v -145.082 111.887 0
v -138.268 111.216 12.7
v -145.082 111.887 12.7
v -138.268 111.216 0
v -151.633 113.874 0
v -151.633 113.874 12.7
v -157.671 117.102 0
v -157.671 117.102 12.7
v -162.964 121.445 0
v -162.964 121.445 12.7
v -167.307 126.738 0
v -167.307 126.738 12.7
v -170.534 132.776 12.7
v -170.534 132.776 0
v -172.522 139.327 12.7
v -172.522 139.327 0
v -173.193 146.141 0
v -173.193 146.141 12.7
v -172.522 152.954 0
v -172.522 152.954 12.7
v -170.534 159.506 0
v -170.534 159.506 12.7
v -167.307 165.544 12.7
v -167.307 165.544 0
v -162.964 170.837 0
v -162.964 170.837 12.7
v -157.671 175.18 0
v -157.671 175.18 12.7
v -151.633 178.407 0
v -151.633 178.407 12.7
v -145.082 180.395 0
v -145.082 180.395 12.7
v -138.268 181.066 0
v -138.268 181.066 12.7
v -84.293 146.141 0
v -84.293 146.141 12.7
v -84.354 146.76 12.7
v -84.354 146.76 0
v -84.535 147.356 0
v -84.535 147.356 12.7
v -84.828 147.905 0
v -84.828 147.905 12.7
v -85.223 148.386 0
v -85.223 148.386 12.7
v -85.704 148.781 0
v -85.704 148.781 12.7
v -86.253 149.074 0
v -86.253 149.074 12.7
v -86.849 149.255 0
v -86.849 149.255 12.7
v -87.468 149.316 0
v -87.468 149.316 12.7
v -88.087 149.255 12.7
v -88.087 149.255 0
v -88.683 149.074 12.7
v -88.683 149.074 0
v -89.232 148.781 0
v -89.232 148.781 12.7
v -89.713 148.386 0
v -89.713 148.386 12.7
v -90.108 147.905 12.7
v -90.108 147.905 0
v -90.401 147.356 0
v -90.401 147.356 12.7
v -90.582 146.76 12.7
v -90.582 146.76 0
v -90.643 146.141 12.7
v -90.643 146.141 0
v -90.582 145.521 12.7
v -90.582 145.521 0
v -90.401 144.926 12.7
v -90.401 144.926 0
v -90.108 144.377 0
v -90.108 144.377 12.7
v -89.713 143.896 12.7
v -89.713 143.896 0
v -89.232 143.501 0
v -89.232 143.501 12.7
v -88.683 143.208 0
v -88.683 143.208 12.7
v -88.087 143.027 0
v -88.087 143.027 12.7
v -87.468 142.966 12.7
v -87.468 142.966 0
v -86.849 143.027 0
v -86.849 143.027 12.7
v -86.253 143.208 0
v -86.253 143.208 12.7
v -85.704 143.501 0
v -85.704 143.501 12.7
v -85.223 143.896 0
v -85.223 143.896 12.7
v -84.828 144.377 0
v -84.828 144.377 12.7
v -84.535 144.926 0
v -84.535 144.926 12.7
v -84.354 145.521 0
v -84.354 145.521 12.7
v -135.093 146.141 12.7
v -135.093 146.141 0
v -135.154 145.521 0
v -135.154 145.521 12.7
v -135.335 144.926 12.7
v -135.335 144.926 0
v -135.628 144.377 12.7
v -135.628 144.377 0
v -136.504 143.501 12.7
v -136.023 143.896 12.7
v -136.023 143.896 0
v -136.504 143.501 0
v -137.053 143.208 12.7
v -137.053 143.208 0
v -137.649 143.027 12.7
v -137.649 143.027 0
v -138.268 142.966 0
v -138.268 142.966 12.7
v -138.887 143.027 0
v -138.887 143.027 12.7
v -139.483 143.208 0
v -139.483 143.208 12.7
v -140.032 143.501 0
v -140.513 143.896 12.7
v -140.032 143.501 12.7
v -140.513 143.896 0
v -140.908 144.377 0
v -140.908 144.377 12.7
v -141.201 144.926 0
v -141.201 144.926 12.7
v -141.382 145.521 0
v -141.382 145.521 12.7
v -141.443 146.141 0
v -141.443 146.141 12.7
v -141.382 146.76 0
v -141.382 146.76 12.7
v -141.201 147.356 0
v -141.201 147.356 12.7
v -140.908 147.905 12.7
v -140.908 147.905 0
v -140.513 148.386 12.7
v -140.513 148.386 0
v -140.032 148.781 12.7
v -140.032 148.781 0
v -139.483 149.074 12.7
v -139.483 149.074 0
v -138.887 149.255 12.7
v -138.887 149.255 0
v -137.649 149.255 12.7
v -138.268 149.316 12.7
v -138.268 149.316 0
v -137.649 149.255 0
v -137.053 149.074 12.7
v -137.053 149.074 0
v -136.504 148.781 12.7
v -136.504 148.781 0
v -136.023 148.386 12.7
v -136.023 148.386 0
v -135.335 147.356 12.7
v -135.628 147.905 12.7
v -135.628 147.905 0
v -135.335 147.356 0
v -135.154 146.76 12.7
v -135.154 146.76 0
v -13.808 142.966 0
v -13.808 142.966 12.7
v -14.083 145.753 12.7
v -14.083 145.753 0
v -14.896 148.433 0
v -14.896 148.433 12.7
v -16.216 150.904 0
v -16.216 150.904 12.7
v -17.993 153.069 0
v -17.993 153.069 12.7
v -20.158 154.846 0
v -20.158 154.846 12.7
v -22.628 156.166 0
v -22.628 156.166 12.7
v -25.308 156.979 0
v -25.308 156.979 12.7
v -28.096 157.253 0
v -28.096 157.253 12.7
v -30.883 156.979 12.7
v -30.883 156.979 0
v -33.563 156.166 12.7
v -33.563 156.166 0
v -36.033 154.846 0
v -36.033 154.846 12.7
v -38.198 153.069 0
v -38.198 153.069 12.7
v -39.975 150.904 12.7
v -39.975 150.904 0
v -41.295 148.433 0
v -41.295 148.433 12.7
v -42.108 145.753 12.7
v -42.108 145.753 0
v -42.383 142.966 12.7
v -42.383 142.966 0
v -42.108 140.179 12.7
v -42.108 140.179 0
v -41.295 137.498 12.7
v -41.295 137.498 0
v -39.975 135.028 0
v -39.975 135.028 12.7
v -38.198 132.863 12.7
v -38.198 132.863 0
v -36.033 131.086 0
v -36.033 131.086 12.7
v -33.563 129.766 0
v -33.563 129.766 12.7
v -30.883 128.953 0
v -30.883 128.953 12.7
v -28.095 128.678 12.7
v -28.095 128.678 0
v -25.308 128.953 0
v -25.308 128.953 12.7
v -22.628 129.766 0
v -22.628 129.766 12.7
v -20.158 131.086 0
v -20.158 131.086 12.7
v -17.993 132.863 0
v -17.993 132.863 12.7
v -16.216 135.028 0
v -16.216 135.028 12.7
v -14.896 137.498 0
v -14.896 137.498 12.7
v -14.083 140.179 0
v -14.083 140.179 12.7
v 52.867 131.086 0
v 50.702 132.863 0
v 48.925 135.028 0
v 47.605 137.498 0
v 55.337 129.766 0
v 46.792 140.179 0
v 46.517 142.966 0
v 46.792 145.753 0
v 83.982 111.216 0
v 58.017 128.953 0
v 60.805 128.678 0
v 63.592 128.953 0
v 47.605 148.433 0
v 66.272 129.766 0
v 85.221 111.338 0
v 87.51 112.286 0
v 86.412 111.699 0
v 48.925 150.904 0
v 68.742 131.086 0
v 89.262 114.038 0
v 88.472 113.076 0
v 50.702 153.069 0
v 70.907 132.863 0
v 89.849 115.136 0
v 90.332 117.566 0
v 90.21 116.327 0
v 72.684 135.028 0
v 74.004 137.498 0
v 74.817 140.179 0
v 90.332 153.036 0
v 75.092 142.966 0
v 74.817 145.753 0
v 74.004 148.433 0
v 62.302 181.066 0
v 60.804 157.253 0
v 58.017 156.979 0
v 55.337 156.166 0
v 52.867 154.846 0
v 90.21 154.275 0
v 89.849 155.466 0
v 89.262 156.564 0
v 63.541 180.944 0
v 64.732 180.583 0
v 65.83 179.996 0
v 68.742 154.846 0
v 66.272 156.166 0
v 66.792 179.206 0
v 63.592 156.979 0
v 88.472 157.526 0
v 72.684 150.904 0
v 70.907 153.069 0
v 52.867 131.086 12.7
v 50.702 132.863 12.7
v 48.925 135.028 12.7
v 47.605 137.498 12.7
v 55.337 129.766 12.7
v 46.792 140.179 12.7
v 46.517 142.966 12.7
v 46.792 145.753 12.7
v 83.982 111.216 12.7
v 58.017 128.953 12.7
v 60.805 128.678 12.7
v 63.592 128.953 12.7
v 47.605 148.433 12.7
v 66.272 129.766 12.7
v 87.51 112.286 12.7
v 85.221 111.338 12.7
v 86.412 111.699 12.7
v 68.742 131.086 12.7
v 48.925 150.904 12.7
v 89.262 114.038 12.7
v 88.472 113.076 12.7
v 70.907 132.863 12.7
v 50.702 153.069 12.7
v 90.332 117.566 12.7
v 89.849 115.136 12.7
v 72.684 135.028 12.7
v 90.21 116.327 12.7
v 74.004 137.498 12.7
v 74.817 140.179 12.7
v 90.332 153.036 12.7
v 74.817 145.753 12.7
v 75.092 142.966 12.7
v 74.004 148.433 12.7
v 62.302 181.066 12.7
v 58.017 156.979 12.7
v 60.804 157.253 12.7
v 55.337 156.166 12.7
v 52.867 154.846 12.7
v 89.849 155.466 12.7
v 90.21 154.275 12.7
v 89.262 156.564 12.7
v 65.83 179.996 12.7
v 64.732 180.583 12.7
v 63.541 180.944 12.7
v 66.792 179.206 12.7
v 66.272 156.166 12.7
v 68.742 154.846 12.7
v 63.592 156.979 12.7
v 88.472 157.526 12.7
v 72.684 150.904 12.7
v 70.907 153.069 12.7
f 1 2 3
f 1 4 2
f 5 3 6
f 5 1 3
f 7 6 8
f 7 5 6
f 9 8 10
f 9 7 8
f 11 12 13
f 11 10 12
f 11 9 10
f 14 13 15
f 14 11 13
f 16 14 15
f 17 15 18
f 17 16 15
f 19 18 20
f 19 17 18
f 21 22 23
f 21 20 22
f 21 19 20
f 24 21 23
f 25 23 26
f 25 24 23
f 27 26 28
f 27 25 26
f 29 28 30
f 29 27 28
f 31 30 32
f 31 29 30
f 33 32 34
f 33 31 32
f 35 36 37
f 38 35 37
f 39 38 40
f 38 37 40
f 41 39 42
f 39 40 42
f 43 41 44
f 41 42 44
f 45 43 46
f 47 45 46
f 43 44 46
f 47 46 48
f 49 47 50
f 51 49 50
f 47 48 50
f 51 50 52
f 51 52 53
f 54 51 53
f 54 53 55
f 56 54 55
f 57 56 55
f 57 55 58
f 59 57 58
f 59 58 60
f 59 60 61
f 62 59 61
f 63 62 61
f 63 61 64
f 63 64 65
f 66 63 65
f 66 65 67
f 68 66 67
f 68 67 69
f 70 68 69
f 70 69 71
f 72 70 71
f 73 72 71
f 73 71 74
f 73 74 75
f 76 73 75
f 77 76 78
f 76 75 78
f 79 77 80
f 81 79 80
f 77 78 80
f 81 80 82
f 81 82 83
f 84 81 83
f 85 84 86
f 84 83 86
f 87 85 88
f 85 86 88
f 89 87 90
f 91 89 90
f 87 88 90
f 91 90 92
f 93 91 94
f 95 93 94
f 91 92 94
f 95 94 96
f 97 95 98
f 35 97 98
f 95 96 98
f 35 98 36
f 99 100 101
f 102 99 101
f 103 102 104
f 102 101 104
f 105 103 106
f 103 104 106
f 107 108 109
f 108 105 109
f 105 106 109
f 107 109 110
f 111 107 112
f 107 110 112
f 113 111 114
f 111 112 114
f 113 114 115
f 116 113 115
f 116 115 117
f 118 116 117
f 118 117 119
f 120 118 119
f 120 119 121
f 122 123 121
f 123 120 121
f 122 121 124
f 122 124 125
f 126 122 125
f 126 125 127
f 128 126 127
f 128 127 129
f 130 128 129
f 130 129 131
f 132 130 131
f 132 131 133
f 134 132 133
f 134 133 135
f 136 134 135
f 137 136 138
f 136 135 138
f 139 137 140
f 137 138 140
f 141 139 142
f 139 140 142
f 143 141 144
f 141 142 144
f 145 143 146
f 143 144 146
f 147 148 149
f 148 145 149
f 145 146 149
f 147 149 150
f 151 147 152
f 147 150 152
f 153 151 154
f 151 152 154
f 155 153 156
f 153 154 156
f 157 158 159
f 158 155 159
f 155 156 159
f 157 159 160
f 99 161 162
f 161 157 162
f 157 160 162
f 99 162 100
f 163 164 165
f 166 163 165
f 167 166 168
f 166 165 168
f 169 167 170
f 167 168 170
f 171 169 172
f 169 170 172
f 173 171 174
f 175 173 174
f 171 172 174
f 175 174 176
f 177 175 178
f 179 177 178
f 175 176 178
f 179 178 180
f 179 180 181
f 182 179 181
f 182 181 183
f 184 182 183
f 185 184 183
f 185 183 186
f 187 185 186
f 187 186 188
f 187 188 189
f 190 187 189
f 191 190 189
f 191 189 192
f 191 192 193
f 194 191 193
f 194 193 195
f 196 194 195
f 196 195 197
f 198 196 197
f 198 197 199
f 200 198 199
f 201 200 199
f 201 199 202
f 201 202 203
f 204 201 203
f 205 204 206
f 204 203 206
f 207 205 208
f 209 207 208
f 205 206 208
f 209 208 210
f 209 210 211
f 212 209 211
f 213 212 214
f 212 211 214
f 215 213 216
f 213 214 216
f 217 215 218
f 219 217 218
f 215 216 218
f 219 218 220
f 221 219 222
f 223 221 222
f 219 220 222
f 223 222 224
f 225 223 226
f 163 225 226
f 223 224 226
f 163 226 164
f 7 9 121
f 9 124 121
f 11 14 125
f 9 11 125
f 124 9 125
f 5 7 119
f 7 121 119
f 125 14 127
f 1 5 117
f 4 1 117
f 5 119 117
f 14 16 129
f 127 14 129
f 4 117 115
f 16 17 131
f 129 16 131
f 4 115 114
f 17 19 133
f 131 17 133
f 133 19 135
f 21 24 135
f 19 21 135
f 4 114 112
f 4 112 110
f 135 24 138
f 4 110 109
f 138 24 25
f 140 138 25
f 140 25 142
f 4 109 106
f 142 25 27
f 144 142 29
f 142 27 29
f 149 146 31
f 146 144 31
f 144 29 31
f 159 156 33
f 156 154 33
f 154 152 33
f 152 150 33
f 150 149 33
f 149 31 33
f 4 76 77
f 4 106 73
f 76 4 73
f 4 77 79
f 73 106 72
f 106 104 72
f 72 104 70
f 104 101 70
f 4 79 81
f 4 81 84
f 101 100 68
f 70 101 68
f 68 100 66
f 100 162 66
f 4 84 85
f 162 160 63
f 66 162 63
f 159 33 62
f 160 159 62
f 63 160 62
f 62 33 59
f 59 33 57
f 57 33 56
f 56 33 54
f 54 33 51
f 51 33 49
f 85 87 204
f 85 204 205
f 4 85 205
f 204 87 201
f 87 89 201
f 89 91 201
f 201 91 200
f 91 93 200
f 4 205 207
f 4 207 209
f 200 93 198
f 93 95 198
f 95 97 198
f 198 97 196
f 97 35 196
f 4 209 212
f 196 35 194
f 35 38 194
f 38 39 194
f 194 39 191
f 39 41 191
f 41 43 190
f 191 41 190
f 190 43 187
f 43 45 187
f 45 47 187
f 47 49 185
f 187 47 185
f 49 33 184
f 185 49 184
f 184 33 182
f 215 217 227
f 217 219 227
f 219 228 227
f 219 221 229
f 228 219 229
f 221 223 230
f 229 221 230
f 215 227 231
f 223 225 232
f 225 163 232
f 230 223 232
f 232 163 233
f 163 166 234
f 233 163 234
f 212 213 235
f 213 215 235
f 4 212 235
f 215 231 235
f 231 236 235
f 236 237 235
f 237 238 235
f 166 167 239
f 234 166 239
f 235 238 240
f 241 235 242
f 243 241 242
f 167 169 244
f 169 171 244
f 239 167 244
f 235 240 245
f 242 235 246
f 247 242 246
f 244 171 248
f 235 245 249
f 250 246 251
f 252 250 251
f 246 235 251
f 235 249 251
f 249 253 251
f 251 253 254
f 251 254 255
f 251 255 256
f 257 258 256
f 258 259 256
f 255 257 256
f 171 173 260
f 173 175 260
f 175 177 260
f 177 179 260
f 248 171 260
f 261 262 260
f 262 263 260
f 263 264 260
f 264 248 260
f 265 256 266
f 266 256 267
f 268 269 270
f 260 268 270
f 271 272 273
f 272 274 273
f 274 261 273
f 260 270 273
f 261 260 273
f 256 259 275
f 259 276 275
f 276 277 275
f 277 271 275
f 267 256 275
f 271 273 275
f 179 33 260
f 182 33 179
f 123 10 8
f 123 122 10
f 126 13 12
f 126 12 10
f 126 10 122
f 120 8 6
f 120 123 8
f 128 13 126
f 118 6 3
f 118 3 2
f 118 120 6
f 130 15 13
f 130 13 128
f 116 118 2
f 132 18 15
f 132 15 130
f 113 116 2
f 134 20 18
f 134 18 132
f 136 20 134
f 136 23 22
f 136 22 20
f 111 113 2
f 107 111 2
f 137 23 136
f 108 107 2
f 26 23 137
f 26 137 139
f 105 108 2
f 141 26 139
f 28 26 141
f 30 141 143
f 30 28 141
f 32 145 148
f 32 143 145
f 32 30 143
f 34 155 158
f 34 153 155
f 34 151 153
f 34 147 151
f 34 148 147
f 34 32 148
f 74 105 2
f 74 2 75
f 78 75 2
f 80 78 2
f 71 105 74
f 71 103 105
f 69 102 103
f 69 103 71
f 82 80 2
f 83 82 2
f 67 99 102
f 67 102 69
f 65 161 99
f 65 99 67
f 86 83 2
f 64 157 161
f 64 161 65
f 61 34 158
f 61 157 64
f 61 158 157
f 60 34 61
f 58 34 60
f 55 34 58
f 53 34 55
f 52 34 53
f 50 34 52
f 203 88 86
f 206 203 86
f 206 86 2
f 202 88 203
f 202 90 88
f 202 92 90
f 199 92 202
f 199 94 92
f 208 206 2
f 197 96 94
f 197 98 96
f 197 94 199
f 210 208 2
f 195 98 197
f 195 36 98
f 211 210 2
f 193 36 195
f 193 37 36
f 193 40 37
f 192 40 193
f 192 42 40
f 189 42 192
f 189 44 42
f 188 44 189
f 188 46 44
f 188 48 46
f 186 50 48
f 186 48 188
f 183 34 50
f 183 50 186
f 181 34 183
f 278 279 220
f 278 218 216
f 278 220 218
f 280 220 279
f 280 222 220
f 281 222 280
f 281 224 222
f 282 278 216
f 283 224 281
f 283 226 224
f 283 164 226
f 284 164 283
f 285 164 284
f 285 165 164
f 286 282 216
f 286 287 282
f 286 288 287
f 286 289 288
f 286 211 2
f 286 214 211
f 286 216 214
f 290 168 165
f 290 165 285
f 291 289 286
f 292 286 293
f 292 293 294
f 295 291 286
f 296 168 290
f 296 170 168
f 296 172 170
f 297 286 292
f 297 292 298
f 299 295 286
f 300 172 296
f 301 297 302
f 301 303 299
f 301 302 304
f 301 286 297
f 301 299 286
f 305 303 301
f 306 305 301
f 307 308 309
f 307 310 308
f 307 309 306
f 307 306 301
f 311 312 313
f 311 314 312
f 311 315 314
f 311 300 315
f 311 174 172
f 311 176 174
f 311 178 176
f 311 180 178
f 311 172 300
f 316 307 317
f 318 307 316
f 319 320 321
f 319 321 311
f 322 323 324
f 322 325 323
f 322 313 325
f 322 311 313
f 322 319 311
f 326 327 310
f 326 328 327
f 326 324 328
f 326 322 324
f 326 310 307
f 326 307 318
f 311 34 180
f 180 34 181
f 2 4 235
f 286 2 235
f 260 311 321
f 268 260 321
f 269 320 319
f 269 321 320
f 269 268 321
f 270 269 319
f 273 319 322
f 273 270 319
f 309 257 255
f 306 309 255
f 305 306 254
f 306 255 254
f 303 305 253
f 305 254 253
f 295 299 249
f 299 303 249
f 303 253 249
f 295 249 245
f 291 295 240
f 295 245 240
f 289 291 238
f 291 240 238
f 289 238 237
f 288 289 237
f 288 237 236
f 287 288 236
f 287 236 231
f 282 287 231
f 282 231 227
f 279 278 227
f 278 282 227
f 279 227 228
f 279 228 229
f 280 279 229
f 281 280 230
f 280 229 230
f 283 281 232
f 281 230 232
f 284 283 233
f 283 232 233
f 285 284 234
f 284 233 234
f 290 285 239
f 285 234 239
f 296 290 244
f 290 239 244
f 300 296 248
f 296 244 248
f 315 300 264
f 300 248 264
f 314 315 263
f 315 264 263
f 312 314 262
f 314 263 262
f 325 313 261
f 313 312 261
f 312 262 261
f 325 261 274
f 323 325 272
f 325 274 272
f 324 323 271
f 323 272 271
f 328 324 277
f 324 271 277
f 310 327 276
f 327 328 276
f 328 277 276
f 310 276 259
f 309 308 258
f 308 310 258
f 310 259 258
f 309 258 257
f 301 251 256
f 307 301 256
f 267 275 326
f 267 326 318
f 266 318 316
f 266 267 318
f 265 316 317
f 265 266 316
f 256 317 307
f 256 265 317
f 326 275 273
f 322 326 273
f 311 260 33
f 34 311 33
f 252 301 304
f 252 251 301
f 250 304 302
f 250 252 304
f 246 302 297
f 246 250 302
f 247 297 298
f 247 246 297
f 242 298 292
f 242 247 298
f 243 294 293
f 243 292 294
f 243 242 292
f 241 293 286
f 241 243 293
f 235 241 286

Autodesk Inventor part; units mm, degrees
ref_plane "YZ Plane" through (0, 0, 0) normal (1, 0, 0) x (0, 1, 0)
ref_plane "XZ Plane" through (0, 0, 0) normal (0, 1, 0) x (-1, 0, 0)
ref_plane "XY Plane" through (0, 0, 0) normal (0, 0, 1) x (1, 0, 0)
sketch "Sketch1" plane through (0, 0, 0) normal (0, 0, 1) x (1, 0, 0)
  line L0 (90.332, 117.5659) -> (90.332, 153.0357)
  line L1 (88.4722, 157.5258) -> (66.7919, 179.2061)
  line L2 (62.3018, 181.0659) -> (-138.268, 181.0659)
  circle A0 centre (60.8045, 142.9659) radius 14.2875
  arc A1 (66.7919, 179.2061) -> (62.3018, 181.0659) centre (62.3018, 174.7159) ccw
  arc A2 (90.332, 153.0357) -> (88.4722, 157.5258) centre (83.982, 153.0357) ccw
  arc A3 (83.982, 111.2159) -> (90.332, 117.5659) centre (83.982, 117.5659) ccw
  line L3 (-138.268, 111.2159) -> (83.982, 111.2159)
  arc A4 (-138.268, 181.0659) -> (-138.268, 111.2159) centre (-138.268, 146.1409) ccw
  circle A5 centre (-138.268, 146.1409) radius 3.175
  dimension "d61" = 69.85
  dimension "d68" = 222.25
  dimension "d69" = 200.5697
  dimension "d71" = 28.575
  dimension "d72" = 6.35
extrude "Extrusion10" add sketch "Sketch1" along normal blind 12.7
sketch "Sketch8" plane through (0, 0, 12.7) normal (0, 0, 1) x (1, 0, 0)
  circle A0 centre (60.8045, 142.9659) radius 14.2875 projected
  circle A1 centre (-138.268, 146.1409) radius 3.175 projected
  line L0 (62.3018, 181.0659) -> (-138.268, 181.0659) projected
  arc A2 (-138.268, 181.0659) -> (-138.268, 111.2159) centre (-138.268, 146.1409) ccw projected
  line L1 (-138.268, 111.2159) -> (83.982, 111.2159) projected
  arc A3 (83.982, 111.2159) -> (90.332, 117.5659) centre (83.982, 117.5659) ccw projected
  line L2 (90.332, 117.5659) -> (90.332, 153.0357) projected
  arc A4 (90.332, 153.0357) -> (88.4722, 157.5258) centre (83.982, 153.0357) ccw projected
  line L3 (88.4722, 157.5258) -> (66.7919, 179.2061) projected
  arc A5 (66.7919, 179.2061) -> (62.3018, 181.0659) centre (62.3018, 174.7159) ccw projected
  circle A6 centre (60.8045, 142.9659) radius 50.8 construction
  line L4 (60.8045, 142.9659) -> (-28.0955, 142.9659) construction
  circle A7 centre (-28.0955, 142.9659) radius 14.2875
  point P0 (0, 0)
  dimension "d75" = 101.6
  dimension "d76" = 88.9
  dimension "d77" = 28.575
extrude "Extrusion11" cut sketch "Sketch8" against normal through all contours A7
sketch "Sketch9" plane through (0, 0, 12.7) normal (0, 0, 1) x (1, 0, 0)
  circle A0 centre (-28.0955, 142.9659) radius 14.2875 projected
  circle A1 centre (60.8045, 142.9659) radius 14.2875 projected
  circle A2 centre (-138.268, 146.1409) radius 3.175 projected
  line L0 (62.3018, 181.0659) -> (-138.268, 181.0659) projected
  arc A3 (-138.268, 181.0659) -> (-138.268, 111.2159) centre (-138.268, 146.1409) ccw projected
  line L1 (-138.268, 111.2159) -> (83.982, 111.2159) projected
  arc A4 (83.982, 111.2159) -> (90.332, 117.5659) centre (83.982, 117.5659) ccw projected
  line L2 (90.332, 117.5659) -> (90.332, 153.0357) projected
  arc A5 (90.332, 153.0357) -> (88.4722, 157.5258) centre (83.982, 153.0357) ccw projected
  line L3 (88.4722, 157.5258) -> (66.7919, 179.2061) projected
  arc A6 (66.7919, 179.2061) -> (62.3018, 181.0659) centre (62.3018, 174.7159) ccw projected
  line L4 (60.8045, 142.9659) -> (111.6045, 142.9659)
  line L5 (-173.193, 146.1409) -> (-173.193, 114.3909)
  line L6 (60.8045, 142.9659) -> (-173.193, 142.9659)
  point P0 (0, 0)
  dimension "d80" = 50.8
  dimension "d81" = 284.7975
sketch "Sketch10" plane through (0, 0, 12.7) normal (0, 0, 1) x (1, 0, 0)
  circle A0 centre (-28.0955, 142.9659) radius 14.2875 projected
  circle A1 centre (60.8045, 142.9659) radius 14.2875 projected
  circle A2 centre (-138.268, 146.1409) radius 3.175 projected
  line L0 (62.3018, 181.0659) -> (-138.268, 181.0659) projected
  arc A3 (-138.268, 181.0659) -> (-138.268, 111.2159) centre (-138.268, 146.1409) ccw projected
  line L1 (-138.268, 111.2159) -> (83.982, 111.2159) projected
  arc A4 (83.982, 111.2159) -> (90.332, 117.5659) centre (83.982, 117.5659) ccw projected
  line L2 (90.332, 117.5659) -> (90.332, 153.0357) projected
  arc A5 (90.332, 153.0357) -> (88.4722, 157.5258) centre (83.982, 153.0357) ccw projected
  line L3 (88.4722, 157.5258) -> (66.7919, 179.2061) projected
  arc A6 (66.7919, 179.2061) -> (62.3018, 181.0659) centre (62.3018, 174.7159) ccw projected
  line L4 (-138.268, 146.1409) -> (-87.468, 146.1409) construction
  circle A7 centre (-87.468, 146.1409) radius 3.175
  point P0 (0, 0)
  dimension "d82" = 50.8
  dimension "d83" = 6.35
extrude "Extrusion12" cut sketch "Sketch10" against normal through all contours A7
properties part number "Top IntakeBar"
